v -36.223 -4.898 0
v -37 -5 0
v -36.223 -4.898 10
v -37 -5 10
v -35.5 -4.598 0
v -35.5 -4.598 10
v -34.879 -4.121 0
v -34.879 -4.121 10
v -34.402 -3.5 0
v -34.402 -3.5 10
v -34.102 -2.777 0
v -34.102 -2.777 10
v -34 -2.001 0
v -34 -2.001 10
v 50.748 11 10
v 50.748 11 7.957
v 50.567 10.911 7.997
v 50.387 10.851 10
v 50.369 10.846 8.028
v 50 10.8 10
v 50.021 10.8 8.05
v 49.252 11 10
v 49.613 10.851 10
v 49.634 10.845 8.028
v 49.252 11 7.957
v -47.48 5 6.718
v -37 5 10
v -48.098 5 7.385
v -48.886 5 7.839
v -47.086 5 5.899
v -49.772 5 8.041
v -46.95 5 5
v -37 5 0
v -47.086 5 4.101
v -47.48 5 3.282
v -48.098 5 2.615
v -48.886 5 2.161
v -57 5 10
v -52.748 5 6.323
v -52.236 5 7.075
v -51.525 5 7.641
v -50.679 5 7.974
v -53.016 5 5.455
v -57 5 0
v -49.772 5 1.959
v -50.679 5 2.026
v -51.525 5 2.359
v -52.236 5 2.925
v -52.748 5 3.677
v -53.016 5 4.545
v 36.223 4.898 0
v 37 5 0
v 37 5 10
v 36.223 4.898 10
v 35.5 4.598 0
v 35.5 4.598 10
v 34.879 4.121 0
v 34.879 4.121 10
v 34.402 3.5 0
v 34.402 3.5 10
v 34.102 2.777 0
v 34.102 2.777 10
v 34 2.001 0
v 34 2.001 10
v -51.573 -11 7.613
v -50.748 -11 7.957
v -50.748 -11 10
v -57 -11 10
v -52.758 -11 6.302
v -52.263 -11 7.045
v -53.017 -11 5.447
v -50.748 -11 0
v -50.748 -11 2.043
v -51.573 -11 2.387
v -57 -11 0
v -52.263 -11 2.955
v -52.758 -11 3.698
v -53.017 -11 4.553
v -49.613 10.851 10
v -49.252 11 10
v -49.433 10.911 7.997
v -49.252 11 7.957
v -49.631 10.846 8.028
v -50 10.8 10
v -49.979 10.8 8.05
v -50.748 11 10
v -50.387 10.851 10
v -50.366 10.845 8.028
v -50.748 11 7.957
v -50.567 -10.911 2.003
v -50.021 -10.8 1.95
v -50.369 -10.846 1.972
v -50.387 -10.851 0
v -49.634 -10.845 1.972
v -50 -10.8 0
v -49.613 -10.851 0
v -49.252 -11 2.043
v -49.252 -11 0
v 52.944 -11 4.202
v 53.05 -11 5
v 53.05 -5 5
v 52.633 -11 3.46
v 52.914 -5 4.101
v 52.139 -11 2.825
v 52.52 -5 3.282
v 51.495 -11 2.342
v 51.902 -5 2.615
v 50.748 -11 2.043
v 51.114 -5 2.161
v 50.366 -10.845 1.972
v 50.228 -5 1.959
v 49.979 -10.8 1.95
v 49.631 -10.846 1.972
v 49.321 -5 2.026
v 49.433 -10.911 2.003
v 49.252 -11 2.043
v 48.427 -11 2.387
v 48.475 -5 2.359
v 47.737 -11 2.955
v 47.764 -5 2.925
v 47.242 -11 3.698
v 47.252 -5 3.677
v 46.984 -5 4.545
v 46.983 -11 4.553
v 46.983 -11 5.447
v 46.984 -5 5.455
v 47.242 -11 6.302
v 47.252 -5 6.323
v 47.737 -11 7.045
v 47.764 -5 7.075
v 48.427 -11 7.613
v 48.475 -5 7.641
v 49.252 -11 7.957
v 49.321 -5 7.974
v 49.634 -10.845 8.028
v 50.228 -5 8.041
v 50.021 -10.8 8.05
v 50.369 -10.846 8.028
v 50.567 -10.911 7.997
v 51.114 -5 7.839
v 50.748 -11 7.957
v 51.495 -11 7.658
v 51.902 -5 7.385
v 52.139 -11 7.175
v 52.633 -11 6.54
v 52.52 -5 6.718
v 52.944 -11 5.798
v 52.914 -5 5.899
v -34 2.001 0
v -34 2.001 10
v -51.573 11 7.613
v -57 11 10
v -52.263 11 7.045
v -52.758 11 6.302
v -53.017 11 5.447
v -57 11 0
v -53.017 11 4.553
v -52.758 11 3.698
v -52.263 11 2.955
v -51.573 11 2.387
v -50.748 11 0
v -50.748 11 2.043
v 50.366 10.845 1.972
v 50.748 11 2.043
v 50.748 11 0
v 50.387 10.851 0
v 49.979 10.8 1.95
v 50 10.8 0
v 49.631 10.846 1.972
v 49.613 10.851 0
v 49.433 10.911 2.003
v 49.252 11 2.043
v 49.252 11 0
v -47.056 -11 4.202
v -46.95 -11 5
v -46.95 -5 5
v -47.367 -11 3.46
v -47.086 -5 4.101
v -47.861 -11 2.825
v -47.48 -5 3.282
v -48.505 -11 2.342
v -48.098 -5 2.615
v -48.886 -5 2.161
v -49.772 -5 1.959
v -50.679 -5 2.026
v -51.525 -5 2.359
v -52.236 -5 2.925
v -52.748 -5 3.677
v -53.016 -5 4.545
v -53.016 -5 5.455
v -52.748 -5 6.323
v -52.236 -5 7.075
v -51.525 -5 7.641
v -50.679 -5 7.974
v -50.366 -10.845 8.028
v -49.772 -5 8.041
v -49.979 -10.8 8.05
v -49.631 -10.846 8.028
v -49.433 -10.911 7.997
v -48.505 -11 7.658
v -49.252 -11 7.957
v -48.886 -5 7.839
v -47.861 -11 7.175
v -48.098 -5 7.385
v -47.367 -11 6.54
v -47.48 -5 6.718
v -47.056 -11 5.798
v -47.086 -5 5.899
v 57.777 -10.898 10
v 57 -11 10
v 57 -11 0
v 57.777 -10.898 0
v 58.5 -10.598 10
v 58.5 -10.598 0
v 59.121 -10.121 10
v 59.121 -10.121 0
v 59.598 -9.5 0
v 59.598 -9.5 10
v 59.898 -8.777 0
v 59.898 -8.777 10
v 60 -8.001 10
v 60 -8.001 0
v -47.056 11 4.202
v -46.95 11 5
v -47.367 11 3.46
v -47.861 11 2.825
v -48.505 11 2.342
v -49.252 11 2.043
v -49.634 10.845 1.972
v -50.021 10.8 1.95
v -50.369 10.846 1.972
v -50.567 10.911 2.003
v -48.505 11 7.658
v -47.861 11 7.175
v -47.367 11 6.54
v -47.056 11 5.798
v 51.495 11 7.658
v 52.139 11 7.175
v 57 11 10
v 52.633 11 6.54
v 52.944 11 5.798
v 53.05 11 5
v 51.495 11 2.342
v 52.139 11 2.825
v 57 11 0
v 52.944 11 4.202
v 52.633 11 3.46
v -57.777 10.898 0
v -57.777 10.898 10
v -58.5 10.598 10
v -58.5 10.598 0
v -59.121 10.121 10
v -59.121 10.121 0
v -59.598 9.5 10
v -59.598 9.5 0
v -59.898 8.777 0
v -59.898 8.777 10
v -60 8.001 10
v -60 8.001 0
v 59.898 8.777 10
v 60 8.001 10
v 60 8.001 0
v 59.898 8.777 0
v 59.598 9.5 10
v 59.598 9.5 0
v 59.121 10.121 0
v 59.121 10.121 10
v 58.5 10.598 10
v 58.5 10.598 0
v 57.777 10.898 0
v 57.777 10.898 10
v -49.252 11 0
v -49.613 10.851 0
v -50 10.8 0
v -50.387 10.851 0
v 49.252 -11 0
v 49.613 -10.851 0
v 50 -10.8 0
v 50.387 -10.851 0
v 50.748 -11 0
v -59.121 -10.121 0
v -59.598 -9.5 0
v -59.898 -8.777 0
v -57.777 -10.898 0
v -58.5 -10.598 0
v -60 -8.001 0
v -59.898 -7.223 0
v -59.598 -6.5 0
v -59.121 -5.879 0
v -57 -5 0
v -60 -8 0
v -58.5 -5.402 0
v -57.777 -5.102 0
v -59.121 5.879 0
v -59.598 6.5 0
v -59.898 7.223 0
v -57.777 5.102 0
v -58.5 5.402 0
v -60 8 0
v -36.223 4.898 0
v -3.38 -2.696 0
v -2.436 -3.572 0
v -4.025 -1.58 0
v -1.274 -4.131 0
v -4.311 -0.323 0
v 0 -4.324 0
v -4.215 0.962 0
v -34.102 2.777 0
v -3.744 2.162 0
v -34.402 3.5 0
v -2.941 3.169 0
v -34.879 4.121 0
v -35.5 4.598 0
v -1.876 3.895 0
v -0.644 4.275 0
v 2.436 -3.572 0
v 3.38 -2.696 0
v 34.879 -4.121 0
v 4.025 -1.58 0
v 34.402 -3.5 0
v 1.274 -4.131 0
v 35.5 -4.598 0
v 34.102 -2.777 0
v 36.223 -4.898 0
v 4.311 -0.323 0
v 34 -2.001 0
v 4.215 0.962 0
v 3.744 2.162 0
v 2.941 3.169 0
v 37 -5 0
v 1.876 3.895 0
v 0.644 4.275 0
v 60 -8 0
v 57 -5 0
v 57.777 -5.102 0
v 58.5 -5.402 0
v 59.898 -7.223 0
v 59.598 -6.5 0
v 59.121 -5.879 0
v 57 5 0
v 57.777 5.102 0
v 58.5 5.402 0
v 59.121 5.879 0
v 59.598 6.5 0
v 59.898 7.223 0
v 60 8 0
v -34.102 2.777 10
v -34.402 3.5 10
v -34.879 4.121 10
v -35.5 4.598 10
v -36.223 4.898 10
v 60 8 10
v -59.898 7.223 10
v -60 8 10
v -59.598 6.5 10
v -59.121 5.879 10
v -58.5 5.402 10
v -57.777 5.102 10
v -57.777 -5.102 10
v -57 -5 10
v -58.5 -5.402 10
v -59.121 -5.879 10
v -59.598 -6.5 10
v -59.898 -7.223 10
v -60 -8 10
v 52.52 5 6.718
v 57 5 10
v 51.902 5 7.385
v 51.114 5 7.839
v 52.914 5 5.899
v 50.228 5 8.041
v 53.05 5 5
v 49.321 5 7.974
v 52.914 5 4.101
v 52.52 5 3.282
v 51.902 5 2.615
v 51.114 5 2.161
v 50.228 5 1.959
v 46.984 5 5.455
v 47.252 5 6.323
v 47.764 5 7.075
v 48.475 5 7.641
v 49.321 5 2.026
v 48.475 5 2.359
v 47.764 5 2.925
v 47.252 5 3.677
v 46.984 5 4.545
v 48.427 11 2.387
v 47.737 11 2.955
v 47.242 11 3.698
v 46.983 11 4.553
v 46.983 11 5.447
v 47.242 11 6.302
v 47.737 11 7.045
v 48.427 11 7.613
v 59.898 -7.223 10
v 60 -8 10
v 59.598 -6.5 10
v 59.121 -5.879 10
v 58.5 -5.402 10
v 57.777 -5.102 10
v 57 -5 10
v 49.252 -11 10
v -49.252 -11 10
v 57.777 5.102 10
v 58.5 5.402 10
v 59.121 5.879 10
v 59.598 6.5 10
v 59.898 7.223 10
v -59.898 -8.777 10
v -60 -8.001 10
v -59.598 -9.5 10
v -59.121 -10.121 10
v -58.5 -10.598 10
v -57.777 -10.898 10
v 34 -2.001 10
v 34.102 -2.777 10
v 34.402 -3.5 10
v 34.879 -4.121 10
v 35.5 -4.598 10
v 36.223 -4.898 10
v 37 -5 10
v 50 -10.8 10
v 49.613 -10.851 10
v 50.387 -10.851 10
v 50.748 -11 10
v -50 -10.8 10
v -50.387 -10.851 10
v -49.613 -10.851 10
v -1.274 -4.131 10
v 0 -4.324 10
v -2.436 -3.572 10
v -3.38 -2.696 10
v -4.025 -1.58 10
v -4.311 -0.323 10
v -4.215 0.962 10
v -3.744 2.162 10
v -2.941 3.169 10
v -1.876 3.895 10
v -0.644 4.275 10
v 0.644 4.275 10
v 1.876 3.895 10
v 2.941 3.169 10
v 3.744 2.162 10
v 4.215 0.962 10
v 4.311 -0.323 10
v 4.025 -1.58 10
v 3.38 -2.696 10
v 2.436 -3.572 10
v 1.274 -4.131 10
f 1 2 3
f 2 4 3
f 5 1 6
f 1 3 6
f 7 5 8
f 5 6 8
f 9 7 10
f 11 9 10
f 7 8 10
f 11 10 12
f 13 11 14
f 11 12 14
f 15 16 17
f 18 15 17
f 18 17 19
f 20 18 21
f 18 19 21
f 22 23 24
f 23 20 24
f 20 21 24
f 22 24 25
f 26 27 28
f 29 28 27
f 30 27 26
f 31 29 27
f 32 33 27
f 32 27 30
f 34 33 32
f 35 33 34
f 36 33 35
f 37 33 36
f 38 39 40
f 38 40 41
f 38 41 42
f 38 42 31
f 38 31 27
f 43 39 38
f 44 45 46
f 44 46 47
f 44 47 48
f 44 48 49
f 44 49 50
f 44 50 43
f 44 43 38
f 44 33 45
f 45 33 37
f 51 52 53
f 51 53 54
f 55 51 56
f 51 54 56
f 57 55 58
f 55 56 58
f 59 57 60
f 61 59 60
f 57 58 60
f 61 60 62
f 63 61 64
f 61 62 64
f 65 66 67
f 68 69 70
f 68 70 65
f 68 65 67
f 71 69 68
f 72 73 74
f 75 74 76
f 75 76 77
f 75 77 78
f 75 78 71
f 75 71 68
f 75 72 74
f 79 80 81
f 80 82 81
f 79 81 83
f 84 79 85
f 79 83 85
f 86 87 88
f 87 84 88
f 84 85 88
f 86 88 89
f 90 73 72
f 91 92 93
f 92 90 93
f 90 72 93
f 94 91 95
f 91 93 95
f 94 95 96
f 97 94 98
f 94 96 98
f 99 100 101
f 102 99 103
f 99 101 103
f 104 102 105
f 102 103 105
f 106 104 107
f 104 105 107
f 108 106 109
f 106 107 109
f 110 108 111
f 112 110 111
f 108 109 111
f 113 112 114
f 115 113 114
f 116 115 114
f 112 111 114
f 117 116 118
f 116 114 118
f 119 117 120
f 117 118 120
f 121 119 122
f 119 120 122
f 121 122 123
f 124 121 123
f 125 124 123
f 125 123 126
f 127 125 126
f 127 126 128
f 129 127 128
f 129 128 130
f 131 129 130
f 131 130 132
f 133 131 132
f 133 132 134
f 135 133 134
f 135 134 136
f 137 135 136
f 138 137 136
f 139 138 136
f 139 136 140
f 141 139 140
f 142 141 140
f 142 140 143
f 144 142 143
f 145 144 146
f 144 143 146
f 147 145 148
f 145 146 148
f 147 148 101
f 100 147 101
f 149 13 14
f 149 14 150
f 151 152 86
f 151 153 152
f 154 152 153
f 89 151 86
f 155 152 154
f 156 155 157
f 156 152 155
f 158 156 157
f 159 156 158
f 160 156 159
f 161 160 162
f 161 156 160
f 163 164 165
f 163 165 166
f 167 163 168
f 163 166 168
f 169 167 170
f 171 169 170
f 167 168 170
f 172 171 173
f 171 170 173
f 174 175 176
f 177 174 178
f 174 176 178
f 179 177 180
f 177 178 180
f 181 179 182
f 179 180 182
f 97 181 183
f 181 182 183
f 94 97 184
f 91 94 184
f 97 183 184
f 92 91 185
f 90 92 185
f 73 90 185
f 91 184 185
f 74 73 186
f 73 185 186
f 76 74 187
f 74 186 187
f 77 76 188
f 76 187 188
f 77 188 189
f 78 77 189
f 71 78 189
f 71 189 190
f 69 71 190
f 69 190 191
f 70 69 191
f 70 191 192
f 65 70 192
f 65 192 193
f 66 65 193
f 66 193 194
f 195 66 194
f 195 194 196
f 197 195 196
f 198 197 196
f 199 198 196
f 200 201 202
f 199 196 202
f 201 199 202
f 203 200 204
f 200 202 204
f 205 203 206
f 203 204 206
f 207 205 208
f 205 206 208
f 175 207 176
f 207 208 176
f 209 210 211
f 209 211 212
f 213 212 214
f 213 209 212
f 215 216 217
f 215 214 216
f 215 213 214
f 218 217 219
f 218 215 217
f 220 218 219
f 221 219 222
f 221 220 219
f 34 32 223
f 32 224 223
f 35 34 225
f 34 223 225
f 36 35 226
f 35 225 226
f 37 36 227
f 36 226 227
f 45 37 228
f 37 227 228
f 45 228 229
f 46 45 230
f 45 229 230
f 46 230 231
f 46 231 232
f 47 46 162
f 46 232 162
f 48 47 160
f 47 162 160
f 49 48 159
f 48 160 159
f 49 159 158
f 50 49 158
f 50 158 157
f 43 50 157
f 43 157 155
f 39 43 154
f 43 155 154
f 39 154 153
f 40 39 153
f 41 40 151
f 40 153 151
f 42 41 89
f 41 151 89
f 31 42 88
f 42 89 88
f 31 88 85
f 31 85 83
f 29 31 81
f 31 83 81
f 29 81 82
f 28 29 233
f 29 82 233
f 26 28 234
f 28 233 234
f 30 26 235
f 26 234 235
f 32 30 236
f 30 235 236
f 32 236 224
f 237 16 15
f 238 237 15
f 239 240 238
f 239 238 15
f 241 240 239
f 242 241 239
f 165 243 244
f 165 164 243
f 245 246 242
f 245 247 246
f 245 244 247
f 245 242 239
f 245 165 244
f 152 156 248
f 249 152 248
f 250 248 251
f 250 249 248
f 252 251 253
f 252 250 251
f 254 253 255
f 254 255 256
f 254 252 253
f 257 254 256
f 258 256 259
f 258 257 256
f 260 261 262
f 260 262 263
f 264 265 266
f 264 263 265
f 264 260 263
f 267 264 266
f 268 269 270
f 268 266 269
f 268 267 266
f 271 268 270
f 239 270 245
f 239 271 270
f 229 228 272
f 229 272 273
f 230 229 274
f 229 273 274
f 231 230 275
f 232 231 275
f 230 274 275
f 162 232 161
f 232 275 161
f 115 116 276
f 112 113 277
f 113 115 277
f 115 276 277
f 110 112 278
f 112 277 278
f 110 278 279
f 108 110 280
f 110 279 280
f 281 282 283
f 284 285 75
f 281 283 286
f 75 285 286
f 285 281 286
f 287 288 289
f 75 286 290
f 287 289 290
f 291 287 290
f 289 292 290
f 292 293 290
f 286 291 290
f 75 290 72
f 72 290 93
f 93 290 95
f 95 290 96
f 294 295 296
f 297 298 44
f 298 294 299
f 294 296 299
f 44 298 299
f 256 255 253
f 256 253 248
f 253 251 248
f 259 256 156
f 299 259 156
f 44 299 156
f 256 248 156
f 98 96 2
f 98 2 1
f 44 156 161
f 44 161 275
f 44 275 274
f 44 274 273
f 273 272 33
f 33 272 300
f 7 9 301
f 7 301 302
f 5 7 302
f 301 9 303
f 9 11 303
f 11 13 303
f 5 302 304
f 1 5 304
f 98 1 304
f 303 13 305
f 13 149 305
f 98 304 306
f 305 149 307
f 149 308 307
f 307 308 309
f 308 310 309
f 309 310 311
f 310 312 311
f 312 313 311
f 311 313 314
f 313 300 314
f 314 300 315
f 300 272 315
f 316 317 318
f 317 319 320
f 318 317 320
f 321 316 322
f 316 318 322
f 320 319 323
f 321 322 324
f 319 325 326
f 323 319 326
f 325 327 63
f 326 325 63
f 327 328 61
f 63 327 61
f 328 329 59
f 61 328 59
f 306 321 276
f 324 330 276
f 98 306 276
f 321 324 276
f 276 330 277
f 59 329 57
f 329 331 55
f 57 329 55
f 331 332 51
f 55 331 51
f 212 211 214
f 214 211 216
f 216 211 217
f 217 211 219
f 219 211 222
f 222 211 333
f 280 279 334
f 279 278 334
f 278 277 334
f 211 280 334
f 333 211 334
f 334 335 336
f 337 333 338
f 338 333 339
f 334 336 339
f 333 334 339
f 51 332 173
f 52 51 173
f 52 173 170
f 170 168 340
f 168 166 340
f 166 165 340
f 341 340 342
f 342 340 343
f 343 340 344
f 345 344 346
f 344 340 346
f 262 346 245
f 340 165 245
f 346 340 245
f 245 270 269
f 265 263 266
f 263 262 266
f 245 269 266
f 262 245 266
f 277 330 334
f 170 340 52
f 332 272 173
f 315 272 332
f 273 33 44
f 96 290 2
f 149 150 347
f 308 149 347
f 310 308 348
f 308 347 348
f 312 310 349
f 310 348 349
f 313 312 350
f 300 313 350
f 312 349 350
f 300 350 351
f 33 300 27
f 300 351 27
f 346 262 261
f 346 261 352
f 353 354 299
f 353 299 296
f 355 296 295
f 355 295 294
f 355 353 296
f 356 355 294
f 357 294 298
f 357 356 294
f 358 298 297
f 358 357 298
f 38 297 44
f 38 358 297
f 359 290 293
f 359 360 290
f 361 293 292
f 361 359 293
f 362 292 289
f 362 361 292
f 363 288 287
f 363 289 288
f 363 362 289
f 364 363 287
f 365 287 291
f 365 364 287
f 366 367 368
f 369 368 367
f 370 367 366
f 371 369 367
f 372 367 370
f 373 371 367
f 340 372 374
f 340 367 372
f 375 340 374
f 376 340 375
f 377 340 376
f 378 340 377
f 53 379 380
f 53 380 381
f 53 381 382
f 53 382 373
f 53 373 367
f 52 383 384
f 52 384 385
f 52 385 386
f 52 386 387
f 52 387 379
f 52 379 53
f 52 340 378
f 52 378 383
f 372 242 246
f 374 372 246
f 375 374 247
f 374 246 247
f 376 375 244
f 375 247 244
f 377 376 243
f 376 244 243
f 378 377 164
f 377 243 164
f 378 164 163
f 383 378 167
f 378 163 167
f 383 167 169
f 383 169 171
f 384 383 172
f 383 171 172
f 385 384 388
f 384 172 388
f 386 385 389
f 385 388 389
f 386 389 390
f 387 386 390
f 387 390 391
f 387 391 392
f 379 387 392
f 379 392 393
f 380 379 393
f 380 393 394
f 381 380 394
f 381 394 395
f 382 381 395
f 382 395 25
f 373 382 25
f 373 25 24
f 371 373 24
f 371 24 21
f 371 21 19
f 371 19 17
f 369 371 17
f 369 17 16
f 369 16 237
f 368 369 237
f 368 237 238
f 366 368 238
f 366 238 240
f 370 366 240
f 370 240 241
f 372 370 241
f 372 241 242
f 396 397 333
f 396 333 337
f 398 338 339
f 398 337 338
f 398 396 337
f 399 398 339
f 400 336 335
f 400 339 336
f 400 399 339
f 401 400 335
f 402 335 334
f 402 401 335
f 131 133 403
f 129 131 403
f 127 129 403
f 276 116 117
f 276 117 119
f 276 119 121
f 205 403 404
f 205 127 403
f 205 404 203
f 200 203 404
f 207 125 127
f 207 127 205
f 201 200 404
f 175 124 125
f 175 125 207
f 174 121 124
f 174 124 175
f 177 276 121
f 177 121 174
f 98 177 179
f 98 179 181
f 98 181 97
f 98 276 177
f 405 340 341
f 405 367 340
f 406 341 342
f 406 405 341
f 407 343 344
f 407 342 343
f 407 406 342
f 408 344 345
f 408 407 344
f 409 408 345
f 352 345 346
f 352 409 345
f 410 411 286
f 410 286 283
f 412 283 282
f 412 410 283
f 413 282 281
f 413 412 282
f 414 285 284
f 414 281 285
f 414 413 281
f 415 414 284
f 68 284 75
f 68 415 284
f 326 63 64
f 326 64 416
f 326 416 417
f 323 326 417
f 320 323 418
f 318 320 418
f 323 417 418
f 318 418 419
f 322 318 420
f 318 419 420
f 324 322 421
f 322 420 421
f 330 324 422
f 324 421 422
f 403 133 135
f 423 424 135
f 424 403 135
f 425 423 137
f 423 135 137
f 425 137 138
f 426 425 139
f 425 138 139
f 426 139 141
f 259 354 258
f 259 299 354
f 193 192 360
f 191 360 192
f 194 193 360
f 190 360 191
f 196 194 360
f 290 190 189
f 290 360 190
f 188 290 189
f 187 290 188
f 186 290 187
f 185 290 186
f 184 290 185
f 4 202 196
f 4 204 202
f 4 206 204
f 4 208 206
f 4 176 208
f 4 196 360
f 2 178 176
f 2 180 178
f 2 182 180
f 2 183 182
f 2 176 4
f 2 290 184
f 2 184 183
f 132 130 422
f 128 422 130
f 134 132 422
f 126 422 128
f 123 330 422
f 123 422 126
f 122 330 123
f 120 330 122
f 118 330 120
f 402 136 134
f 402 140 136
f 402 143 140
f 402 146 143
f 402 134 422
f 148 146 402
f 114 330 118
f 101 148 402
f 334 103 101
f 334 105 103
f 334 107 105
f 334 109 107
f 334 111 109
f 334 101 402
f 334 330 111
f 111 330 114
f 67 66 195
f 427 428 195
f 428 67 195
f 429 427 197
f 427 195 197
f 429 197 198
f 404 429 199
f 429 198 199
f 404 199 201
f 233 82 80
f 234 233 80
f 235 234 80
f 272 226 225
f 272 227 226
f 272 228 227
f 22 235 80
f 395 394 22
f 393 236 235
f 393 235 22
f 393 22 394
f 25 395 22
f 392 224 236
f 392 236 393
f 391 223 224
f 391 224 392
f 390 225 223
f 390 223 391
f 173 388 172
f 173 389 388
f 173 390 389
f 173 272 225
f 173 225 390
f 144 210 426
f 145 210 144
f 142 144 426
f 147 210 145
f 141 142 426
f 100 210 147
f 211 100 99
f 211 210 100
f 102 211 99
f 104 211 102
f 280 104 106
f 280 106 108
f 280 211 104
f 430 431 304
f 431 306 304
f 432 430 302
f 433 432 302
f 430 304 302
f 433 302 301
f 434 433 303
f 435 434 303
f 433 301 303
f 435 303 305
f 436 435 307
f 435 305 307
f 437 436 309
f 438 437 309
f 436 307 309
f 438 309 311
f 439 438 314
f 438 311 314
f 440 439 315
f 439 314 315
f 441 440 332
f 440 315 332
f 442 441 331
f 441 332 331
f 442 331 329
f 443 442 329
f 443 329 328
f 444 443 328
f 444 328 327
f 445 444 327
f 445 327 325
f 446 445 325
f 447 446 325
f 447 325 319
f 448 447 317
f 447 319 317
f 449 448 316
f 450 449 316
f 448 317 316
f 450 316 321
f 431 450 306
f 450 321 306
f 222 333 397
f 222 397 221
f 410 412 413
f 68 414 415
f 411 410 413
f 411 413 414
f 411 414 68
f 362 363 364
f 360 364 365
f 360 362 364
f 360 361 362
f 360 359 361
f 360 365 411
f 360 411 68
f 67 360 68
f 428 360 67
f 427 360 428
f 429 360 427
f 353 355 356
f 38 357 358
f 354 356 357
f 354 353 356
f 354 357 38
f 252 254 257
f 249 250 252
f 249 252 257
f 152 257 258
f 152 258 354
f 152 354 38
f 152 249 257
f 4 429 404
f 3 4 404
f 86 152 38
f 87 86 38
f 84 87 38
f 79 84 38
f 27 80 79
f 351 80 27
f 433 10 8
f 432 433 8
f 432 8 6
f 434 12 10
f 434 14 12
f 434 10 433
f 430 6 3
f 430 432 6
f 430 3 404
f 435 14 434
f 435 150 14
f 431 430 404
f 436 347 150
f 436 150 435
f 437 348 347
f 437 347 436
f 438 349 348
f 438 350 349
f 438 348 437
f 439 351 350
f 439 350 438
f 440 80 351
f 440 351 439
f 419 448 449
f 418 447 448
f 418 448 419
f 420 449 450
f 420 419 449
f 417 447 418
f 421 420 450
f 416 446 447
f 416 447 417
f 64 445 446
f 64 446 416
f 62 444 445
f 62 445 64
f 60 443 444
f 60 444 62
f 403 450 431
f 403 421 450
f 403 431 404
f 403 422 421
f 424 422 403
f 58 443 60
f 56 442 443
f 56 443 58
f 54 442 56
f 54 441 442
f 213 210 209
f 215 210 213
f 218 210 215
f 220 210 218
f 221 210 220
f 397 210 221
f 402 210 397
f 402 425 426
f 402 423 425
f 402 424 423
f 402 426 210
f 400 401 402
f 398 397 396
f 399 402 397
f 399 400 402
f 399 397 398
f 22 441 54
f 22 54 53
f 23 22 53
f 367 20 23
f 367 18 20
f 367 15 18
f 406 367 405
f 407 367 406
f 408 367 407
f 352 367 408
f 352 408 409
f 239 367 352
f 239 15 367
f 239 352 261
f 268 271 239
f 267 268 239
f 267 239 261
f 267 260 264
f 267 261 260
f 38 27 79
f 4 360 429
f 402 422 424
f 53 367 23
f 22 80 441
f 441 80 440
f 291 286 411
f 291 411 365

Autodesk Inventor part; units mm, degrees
ref_plane "YZ Plane" through (0, 0, 0) normal (1, 0, 0) x (0, 1, 0)
ref_plane "XZ Plane" through (0, 0, 0) normal (0, 1, 0) x (-1, 0, 0)
ref_plane "XY Plane" through (0, 0, 0) normal (0, 0, 1) x (1, 0, 0)
sketch "スケッチ1" plane through (0, 0, 0) normal (0, 0, 1) x (1, 0, 0)
  circle A0 centre (0, 0) radius 5 construction
  line L0 (-60, 11) -> (-50.7483, 11)
  line L1 (60, 11) -> (60, 5)
  line L2 (60, 5) -> (34, 5)
  line L3 (34, 5) -> (34, -5)
  line L4 (34, -5) -> (60, -5)
  line L5 (60, -5) -> (60, -11)
  line L6 (60, -11) -> (50.7483, -11)
  line L7 (-60, -11) -> (-60, -5)
  line L8 (-60, -5) -> (-34, -5)
  line L9 (-34, -5) -> (-34, 5)
  line L10 (-34, 5) -> (-60, 5)
  line L11 (-60, 5) -> (-60, 11)
  arc A1 (-49.2517, 11) -> (-50.7483, 11) centre (-50, 12.3) ccw construction
  arc A2 (50.7483, 11) -> (49.2517, 11) centre (50, 12.3) ccw construction
  arc A3 (-50.7483, -11) -> (-49.2517, -11) centre (-50, -12.3) ccw construction
  arc A4 (49.2517, -11) -> (50.7483, -11) centre (50, -12.3) ccw construction
  arc A5 (-50.7483, 11) -> (-49.2517, 11) centre (-50, 12.3) ccw
  line L12 (-49.2517, 11) -> (49.2517, 11)
  line L13 (-50.7483, 11) -> (-49.2517, 11) construction
  line L14 (-49.2517, -11) -> (-50.7483, -11) construction
  line L15 (-50.7483, -11) -> (-60, -11)
  arc A6 (-49.2517, -11) -> (-50.7483, -11) centre (-50, -12.3) ccw
  arc A7 (49.2517, 11) -> (50.7483, 11) centre (50, 12.3) ccw
  line L16 (50.7483, 11) -> (60, 11)
  line L17 (49.2517, 11) -> (50.7483, 11) construction
  arc A8 (50.7483, -11) -> (49.2517, -11) centre (50, -12.3) ccw
  line L18 (50.7483, -11) -> (49.2517, -11) construction
  line L19 (49.2517, -11) -> (-49.2517, -11)
  dimension "d0" = 10
  dimension "d1" = 10
  dimension "d2" = 10
  dimension "d3" = 5
  dimension "d4" = 5
  dimension "d5" = 6
  dimension "d6" = 6
  dimension "d7" = 3
  dimension "d8" = 3
  dimension "d9" = 3
  dimension "d10" = 3
  dimension "d11" = 1.3
  dimension "d12" = 1.3
  dimension "d13" = 1.3
  dimension "d14" = 1.3
  dimension "d15" = 100
  dimension "d17" = 50
  dimension "d19" = 16
  dimension "d20" = 10
  dimension "d21" = 10
  dimension "d22" = 16
extrude "押し出し1" add sketch "スケッチ1" along normal blind 10
sketch "スケッチ2" plane through (-49.2517, 11, 0) normal (0, 1, 0) x (1, 0, 0)
  circle A0 centre (-0.7483, -5) radius 3.05
  circle A1 centre (99.2517, -5) radius 3.05
  line L0 (-10.7483, 0) -> (-10.7483, -10) projected
  point P0 (49.2517, 0)
  point P1 (-10.7483, -5)
  dimension "d26" = 6.1
  dimension "d27" = 6.1
  dimension "d28" = 50
  dimension "d29" = 50
extrude "押し出し2" cut sketch "スケッチ2" against normal through all
fillet "フィレット1" radius 3 12 edges at (-34, 5, 5) (-34, -5, 5) (34, 5, 5) (34, -5, 5) (-60, 11, 5) (-60, 5, 5) (-60, -5, 5) (-60, -11, 5) (60, 11, 5) (60, 5, 5) (60, -5, 5) (60, -11, 5)
sketch "スケッチ4" plane through (0, 0, 10) normal (0, 0, 1) x (1, 0, 0)
  point P0 (0, 0)
hole "穴1" at (0, 0, 10) direction (0, 0, -1) diameter 8.647 end through all thread size "M10x1.25" class "6H" standard "ANSI Metric M Profile"
equation "\"d17\" = 0.5 * d15"
properties part number "ハンド_ピストン先" material "ポリカーボネート、スモーク"
